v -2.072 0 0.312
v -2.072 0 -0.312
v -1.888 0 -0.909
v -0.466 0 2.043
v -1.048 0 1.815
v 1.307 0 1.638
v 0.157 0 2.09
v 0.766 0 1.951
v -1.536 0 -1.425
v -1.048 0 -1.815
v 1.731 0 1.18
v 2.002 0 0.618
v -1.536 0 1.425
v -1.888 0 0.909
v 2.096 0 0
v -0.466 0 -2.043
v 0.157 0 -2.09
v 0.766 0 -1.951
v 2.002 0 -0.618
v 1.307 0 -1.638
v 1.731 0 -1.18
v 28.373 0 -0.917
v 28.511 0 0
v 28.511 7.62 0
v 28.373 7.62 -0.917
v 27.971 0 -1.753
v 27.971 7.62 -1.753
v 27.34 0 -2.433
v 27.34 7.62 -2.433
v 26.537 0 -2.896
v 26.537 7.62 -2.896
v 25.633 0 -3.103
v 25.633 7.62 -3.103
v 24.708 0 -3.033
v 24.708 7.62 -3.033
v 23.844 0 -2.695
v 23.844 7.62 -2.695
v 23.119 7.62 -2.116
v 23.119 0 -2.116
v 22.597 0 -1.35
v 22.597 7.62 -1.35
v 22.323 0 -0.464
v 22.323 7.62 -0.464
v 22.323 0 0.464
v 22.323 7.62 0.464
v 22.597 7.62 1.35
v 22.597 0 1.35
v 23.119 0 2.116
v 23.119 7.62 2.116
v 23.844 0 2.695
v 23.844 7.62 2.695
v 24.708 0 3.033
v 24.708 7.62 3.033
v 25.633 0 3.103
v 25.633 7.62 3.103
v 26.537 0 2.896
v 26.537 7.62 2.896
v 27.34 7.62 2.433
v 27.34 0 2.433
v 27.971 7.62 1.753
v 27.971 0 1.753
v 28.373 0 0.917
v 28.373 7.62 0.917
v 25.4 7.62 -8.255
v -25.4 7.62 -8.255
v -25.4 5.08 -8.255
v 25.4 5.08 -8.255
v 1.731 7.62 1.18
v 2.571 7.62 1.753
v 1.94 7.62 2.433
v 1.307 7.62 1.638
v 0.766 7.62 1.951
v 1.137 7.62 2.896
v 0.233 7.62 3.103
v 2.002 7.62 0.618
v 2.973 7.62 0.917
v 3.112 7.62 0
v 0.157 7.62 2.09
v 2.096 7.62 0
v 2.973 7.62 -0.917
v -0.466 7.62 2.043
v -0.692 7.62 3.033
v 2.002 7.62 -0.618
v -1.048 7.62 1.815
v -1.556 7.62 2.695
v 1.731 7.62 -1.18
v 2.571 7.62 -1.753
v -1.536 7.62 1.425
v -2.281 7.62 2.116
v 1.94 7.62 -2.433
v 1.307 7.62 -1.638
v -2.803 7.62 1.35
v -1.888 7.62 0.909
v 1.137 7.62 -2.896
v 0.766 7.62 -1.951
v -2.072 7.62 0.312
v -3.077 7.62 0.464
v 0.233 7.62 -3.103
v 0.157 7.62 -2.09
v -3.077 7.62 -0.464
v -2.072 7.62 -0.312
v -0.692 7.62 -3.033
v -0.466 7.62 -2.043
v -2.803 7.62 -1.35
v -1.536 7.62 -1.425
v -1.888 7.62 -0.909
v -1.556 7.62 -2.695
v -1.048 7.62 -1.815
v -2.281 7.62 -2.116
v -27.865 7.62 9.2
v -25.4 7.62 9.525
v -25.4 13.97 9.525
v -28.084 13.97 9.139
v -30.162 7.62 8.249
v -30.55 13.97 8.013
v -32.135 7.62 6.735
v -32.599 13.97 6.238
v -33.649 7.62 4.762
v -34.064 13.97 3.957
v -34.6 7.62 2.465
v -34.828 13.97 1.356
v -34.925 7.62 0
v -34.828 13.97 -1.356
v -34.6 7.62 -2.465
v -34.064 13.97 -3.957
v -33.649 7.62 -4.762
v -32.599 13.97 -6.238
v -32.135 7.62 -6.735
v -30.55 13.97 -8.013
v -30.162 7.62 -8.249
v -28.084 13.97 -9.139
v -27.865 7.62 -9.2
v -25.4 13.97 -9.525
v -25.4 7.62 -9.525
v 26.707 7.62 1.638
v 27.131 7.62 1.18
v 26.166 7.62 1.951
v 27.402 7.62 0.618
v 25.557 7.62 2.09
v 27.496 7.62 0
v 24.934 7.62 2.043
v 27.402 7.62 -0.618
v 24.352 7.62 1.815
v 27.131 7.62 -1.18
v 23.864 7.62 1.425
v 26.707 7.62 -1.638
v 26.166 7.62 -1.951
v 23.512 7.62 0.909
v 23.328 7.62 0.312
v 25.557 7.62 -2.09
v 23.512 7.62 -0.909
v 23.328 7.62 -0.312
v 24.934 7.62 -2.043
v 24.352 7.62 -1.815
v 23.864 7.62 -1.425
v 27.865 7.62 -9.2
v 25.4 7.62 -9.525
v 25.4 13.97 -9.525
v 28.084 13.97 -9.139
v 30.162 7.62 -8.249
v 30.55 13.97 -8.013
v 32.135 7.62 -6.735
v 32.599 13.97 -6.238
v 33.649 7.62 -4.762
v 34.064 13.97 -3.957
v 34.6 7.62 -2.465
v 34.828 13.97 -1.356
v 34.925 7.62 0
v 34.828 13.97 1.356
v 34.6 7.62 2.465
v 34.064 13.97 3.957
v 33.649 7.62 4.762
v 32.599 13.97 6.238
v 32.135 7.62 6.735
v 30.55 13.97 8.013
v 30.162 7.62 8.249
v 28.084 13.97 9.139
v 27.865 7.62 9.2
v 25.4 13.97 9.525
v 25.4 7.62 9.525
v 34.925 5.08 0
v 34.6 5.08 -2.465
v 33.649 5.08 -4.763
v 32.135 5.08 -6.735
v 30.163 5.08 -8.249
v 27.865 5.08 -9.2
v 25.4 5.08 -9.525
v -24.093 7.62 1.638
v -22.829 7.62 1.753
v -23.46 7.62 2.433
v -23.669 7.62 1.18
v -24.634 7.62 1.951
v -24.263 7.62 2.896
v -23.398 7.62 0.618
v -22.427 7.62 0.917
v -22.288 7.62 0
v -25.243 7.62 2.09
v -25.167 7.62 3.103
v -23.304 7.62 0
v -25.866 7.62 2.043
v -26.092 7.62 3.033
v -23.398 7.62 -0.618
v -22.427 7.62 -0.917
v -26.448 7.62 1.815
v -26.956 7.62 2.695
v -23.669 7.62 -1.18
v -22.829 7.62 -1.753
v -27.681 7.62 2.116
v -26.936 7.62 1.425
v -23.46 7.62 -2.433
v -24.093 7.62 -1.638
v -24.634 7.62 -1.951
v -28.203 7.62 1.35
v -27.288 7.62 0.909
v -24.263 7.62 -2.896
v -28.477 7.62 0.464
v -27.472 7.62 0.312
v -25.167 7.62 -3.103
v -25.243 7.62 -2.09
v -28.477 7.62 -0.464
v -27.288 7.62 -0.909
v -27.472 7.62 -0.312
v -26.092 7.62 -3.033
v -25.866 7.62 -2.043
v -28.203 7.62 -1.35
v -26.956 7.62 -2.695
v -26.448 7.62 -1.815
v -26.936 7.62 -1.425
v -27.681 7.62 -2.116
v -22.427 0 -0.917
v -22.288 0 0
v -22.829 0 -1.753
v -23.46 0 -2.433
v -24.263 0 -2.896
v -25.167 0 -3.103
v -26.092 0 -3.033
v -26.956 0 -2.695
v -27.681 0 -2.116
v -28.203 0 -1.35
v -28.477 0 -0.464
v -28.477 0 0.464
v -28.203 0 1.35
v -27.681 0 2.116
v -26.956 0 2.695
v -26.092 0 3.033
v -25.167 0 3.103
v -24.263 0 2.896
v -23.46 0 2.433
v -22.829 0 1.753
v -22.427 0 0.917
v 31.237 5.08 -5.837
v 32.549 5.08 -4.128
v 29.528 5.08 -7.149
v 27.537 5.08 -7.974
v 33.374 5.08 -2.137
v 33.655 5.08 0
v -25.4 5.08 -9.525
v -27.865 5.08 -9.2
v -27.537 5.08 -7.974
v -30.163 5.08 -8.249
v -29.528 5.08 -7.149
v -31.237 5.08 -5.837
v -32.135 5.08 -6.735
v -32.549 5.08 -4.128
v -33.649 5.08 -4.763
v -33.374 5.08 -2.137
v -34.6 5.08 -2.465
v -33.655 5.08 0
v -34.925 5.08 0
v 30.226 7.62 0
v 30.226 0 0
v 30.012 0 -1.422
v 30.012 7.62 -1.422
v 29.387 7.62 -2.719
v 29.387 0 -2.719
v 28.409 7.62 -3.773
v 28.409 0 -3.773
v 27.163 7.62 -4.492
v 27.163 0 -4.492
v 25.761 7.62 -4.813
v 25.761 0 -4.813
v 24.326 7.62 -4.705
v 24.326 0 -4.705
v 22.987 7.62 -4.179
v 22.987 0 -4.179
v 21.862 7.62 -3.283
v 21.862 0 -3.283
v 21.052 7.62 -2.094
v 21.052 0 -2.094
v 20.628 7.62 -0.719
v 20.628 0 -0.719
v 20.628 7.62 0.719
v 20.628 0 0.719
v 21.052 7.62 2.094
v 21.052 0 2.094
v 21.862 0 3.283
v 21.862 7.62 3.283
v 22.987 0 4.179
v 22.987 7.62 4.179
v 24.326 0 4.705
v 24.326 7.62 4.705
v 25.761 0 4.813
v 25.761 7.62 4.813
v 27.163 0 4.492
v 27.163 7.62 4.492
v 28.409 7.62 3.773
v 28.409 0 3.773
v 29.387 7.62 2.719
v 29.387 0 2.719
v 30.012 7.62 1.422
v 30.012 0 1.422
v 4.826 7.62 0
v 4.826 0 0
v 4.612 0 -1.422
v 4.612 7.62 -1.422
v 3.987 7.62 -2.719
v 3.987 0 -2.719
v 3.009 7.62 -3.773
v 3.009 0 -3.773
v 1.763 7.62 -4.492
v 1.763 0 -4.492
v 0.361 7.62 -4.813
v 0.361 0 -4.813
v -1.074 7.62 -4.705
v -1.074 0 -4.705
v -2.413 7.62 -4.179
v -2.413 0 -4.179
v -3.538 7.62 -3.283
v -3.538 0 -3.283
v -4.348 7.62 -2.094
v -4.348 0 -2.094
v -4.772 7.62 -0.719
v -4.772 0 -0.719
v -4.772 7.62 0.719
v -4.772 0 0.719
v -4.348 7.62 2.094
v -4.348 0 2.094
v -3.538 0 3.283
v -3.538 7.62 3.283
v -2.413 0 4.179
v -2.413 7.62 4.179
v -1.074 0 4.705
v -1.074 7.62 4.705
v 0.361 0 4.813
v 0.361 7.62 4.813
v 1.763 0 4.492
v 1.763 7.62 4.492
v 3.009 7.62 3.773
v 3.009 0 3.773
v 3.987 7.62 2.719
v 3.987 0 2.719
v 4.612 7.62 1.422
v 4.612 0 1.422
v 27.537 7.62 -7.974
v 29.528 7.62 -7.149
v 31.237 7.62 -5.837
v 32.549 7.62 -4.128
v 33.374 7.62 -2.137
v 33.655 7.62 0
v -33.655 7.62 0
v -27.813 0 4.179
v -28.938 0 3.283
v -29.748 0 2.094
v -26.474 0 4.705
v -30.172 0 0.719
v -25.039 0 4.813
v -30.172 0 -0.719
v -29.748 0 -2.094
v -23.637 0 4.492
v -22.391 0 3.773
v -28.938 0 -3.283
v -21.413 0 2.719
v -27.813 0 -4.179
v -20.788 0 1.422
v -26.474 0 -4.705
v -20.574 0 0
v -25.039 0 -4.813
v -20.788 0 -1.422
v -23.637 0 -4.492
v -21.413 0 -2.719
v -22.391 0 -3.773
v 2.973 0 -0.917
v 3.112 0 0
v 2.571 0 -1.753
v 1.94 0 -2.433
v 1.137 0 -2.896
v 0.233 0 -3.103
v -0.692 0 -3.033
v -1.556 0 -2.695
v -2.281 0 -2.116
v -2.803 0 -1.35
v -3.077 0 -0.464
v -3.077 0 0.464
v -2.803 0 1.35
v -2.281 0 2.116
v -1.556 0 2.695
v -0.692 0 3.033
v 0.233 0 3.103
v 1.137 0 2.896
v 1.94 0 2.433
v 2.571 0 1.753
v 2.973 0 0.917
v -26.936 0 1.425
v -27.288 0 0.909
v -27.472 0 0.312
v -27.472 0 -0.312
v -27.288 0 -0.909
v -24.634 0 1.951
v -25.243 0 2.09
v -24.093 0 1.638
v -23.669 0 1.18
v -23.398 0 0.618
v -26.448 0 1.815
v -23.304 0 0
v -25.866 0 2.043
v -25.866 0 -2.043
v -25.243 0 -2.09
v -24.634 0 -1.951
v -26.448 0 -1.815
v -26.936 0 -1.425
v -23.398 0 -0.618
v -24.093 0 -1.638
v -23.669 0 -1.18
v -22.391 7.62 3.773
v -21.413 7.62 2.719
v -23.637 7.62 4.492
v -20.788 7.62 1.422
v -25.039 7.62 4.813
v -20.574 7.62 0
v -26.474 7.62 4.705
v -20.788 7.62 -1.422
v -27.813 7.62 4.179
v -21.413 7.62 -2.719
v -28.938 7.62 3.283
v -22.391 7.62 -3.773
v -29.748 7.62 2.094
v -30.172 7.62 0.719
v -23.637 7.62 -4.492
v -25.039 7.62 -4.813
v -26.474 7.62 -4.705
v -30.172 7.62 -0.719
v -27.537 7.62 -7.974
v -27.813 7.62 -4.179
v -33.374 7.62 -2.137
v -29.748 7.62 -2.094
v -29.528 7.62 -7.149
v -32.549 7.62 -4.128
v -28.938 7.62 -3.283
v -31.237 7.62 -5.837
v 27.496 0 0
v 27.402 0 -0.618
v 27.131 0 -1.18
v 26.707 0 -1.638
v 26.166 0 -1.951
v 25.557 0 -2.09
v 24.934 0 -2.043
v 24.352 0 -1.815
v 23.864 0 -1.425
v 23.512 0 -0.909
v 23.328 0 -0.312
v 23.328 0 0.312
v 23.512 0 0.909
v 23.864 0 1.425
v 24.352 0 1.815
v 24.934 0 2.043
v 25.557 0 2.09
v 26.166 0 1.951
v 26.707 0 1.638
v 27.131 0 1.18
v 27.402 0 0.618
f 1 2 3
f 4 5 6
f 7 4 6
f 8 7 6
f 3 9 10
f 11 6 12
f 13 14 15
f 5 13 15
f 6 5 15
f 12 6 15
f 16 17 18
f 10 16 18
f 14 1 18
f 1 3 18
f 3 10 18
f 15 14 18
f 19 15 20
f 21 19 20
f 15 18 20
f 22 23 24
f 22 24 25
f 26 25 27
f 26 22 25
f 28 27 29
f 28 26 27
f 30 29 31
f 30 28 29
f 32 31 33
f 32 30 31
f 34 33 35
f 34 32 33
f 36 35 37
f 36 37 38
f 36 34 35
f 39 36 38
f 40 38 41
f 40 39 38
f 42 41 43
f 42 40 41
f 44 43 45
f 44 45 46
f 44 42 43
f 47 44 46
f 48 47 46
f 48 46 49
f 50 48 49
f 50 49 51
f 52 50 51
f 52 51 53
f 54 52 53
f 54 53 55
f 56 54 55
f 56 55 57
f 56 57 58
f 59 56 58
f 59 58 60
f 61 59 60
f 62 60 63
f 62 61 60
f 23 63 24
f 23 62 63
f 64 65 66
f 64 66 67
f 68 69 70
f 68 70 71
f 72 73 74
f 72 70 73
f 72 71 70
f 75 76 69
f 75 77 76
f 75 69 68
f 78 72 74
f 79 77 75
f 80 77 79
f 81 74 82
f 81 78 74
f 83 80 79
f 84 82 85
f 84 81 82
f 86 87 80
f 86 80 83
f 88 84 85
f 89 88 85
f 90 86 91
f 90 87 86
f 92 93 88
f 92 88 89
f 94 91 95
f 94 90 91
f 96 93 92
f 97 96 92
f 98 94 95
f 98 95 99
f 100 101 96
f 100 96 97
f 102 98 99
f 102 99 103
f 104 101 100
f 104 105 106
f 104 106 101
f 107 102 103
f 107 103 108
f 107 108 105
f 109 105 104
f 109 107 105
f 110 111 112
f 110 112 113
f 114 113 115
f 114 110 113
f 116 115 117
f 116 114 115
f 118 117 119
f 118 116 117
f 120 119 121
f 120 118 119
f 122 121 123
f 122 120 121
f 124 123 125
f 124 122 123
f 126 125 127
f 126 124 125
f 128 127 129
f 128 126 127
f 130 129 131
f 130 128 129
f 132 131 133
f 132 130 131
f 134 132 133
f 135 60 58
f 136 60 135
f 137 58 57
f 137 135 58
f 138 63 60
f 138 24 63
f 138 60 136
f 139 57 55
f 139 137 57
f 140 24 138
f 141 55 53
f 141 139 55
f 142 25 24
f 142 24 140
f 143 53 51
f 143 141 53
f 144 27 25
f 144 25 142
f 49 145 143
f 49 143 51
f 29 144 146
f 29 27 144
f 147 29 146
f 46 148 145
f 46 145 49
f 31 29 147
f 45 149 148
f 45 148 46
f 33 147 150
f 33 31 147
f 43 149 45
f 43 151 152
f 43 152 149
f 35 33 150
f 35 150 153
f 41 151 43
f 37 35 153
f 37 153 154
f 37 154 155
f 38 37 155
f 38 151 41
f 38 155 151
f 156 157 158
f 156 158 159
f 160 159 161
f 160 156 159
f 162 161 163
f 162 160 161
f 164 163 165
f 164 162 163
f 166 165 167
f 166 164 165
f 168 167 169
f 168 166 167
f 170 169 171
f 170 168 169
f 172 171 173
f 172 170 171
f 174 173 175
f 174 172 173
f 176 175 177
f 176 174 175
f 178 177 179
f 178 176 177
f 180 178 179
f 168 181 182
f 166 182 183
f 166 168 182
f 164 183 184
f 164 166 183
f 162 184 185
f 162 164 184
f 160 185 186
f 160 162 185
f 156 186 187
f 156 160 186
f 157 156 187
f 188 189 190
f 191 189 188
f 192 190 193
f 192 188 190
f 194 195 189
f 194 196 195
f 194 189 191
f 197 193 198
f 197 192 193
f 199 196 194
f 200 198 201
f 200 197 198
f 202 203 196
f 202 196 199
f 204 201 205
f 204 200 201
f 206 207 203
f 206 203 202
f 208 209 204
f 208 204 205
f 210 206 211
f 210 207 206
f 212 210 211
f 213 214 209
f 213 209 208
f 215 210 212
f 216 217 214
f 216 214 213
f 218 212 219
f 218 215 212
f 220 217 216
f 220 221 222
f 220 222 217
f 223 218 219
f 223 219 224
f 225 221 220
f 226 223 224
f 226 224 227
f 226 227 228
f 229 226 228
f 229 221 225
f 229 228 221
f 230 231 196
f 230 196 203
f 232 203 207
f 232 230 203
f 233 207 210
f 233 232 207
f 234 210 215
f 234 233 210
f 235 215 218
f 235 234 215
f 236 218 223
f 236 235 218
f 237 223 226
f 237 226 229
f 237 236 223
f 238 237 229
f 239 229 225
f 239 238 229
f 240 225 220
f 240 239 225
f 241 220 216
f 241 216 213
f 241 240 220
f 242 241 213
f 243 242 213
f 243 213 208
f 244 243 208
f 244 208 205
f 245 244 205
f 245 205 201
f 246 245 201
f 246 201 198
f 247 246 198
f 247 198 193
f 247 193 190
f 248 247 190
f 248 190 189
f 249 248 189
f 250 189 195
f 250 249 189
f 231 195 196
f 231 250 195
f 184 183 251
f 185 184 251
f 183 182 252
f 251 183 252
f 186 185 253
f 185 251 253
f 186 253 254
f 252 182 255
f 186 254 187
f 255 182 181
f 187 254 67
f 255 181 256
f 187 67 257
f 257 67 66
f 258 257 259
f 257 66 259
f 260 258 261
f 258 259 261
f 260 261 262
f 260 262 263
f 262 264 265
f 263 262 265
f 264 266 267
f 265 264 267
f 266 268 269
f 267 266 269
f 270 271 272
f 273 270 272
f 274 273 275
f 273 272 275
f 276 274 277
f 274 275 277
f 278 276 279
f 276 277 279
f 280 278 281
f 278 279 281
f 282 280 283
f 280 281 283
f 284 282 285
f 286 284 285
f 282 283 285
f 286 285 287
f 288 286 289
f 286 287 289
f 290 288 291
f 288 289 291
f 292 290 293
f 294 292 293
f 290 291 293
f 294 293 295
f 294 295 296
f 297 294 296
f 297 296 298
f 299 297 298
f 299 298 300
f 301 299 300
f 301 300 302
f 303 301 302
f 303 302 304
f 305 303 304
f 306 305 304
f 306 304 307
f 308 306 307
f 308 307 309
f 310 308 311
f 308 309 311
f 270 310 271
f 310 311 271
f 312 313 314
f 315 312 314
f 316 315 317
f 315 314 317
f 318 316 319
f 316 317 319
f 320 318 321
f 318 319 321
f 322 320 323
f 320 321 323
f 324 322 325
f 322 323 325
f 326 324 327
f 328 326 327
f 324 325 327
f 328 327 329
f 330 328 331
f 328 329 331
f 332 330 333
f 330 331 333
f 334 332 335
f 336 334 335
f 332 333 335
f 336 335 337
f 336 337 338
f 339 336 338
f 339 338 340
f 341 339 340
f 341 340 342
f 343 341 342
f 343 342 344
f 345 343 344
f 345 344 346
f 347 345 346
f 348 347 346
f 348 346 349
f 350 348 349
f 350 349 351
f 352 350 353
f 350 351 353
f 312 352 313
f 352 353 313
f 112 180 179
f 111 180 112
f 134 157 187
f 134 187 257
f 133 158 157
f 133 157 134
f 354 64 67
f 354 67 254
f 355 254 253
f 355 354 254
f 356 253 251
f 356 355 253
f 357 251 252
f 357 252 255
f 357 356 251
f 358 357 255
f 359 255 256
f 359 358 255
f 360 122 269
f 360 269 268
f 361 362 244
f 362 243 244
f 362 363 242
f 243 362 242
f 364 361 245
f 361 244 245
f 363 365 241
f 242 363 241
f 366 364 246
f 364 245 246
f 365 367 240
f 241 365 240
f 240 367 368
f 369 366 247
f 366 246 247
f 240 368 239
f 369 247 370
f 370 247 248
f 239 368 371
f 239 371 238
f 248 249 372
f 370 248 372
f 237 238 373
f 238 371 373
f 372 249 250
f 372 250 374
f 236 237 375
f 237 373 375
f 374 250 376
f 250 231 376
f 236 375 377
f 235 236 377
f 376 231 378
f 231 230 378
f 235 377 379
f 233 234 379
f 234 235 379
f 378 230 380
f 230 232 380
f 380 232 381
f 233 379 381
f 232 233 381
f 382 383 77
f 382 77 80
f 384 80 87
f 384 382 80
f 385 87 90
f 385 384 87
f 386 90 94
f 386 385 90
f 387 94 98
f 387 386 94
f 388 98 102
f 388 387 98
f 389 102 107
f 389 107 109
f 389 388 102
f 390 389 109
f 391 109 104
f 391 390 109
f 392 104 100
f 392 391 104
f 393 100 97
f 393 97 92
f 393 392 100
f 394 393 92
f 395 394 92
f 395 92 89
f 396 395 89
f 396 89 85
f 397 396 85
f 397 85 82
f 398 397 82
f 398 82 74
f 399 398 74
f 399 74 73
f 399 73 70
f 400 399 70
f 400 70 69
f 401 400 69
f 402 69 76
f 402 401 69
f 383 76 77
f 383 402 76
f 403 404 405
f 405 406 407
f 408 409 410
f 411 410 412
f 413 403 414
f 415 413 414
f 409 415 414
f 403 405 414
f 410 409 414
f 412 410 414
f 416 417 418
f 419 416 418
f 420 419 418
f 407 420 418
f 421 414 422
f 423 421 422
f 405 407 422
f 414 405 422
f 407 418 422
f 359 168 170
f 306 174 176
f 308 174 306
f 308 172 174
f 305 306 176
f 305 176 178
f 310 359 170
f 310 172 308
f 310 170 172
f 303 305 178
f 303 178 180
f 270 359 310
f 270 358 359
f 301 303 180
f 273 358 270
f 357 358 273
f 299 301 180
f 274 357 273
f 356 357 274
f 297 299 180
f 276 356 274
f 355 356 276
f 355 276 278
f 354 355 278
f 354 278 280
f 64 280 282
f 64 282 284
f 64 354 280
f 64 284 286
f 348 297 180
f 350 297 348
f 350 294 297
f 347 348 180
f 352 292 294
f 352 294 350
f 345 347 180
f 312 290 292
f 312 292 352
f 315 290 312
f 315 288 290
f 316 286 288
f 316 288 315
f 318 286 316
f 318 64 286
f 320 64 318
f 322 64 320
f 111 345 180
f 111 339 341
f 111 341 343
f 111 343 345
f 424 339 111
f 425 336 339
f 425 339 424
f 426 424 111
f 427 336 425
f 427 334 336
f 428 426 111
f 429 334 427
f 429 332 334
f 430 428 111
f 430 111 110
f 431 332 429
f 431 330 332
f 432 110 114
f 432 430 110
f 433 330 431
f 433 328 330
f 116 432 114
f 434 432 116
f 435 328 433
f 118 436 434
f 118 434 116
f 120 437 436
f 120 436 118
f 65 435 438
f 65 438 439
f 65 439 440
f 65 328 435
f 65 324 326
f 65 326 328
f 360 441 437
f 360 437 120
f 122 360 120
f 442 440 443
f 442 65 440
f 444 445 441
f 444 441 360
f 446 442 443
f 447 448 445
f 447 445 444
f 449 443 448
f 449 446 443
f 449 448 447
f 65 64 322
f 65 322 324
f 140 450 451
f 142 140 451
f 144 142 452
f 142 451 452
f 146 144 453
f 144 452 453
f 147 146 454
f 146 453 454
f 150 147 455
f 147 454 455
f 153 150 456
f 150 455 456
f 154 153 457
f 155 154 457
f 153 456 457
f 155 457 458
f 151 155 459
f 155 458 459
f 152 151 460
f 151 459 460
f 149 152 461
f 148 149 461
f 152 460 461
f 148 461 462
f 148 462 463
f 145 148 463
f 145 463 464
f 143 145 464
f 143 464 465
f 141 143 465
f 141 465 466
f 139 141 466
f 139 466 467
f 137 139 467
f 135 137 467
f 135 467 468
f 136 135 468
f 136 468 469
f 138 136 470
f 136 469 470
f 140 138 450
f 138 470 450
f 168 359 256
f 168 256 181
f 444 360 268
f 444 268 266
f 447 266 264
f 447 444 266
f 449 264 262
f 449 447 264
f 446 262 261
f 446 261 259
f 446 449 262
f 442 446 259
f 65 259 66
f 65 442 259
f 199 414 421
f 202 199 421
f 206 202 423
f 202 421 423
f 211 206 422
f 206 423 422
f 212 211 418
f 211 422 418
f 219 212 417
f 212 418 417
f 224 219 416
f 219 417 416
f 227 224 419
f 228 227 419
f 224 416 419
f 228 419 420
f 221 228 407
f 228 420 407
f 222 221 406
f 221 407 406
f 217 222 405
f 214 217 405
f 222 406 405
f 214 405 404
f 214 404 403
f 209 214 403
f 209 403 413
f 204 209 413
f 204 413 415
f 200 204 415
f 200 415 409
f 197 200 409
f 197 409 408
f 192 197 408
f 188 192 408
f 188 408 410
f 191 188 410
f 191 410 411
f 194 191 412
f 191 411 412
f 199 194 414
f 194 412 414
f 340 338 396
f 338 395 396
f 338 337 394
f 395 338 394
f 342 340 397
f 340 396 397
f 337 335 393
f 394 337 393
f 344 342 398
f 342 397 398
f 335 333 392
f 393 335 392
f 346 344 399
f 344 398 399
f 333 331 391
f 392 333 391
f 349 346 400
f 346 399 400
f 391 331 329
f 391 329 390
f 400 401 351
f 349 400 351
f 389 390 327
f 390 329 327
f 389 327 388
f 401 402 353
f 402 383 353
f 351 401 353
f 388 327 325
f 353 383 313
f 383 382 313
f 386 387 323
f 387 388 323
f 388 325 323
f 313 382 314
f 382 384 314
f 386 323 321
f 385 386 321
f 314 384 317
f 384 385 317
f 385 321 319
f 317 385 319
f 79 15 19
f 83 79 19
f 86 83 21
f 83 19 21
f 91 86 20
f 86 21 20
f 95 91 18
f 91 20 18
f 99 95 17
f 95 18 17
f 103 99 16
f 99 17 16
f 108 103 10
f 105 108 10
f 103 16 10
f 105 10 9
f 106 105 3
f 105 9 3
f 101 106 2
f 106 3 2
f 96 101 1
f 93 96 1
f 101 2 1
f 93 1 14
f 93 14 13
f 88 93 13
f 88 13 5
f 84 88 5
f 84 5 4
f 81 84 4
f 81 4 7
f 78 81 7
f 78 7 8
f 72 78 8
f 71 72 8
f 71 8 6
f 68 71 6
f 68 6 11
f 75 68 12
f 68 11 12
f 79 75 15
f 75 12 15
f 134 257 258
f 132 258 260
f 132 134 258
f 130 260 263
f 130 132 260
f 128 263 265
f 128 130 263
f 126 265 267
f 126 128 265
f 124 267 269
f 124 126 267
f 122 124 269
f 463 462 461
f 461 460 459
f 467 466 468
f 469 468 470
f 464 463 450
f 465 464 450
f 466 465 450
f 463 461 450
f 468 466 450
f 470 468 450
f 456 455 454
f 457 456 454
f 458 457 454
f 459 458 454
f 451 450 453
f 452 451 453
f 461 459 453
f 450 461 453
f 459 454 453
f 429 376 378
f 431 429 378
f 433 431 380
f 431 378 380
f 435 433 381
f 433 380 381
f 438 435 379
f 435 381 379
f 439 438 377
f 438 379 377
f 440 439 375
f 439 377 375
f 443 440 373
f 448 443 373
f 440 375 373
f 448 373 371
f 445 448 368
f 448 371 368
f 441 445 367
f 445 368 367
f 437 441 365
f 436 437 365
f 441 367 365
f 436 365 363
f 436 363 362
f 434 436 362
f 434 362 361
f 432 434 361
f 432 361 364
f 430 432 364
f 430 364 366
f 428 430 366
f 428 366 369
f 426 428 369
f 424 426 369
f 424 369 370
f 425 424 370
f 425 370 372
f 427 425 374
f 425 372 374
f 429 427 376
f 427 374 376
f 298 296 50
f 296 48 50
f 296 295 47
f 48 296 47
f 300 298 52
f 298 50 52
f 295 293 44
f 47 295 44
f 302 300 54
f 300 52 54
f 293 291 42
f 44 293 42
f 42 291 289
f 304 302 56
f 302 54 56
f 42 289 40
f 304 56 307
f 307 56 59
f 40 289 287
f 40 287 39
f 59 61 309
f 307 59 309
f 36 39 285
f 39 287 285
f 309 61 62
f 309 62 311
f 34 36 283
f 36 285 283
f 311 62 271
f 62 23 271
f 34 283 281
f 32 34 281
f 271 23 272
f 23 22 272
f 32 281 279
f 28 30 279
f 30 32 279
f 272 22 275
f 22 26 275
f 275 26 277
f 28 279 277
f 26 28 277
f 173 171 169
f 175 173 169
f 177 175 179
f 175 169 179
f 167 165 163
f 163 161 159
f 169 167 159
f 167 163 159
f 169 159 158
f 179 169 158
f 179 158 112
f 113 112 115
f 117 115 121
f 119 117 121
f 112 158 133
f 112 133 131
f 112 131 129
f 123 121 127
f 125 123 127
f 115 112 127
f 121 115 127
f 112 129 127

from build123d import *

# Parameters (mm, degrees)
SKETCH1_R        = 2.0955
PLUGS_DEPTH      = 7.62
SKETCH1_R_2      = 4.826
SKETCH1_R_3      = 3.1115
PLUGS_2_DEPTH    = 7.62
PLUGS_3_DEPTH    = 7.62
PLUGS_4_DEPTH    = 7.62
PLUGS_5_DEPTH    = 7.62
PLUGS_6_DEPTH    = 7.62
BACK_PLATE_DEPTH = 6.35
RAIN_GUARD_DEPTH = 2.54


with BuildPart() as part:
    # Sketch1 → Plugs (new body)
    with BuildSketch(Plane(origin=(0, 0, 0), x_dir=(1, 0, 0), z_dir=(0, 1, 0))):
        with Locations((-25.4, 0)):
            Circle(SKETCH1_R)
    extrude(amount=PLUGS_DEPTH)



with BuildPart() as body_2:
    # Sketch1 → Plugs 2 (new body)
    with BuildSketch(Plane(origin=(0, 0, 0), x_dir=(1, 0, 0), z_dir=(0, 1, 0))):
        with Locations((-25.4, 0)):
            Circle(SKETCH1_R_2)
        with Locations((-25.4, 0)):
            Circle(SKETCH1_R_3, mode=Mode.SUBTRACT)
    extrude(amount=PLUGS_2_DEPTH)


with BuildPart() as body_3:
    # Sketch1 → Plugs 3 (new body)
    with BuildSketch(Plane(origin=(0, 0, 0), x_dir=(1, 0, 0), z_dir=(0, 1, 0))):
        Circle(SKETCH1_R)
    extrude(amount=PLUGS_3_DEPTH)


with BuildPart() as body_4:
    # Sketch1 → Plugs 4 (new body)
    with BuildSketch(Plane(origin=(0, 0, 0), x_dir=(1, 0, 0), z_dir=(0, 1, 0))):
        Circle(SKETCH1_R_2)
        Circle(SKETCH1_R_3, mode=Mode.SUBTRACT)
    extrude(amount=PLUGS_4_DEPTH)


with BuildPart() as body_5:
    # Sketch1 → Plugs 5 (new body)
    with BuildSketch(Plane(origin=(0, 0, 0), x_dir=(1, 0, 0), z_dir=(0, 1, 0))):
        with Locations((25.4, 0)):
            Circle(SKETCH1_R)
    extrude(amount=PLUGS_5_DEPTH)


with BuildPart() as body_6:
    # Sketch1 → Plugs 6 (new body)
    with BuildSketch(Plane(origin=(0, 0, 0), x_dir=(1, 0, 0), z_dir=(0, 1, 0))):
        with Locations((25.4, 0)):
            Circle(SKETCH1_R_2)
        with Locations((25.4, 0)):
            Circle(SKETCH1_R_3, mode=Mode.SUBTRACT)
    extrude(amount=PLUGS_6_DEPTH)


with BuildPart() as part_1:
    add(part.part)

    add(body_2.part)  # Back Plate merges body 2

    add(body_3.part)  # Back Plate merges body 3

    add(body_4.part)  # Back Plate merges body 4

    add(body_5.part)  # Back Plate merges body 5

    add(body_6.part)  # Back Plate merges body 6
    # Sketch2 → Back Plate (add)
    with BuildSketch(Plane(origin=(0, 7.62, 0), x_dir=(1, 0, 0), z_dir=(0, 1, 0))):
        with BuildLine():
            Line((-25.4, 9.525), (25.4, 9.525))
            ThreePointArc((25.4, 9.525), (34.925, 0), (25.4, -9.525))
            Line((25.4, -9.525), (-25.4, -9.525))
            ThreePointArc((-25.4, -9.525), (-34.925, 0), (-25.4, 9.525))
        make_face()
    extrude(amount=BACK_PLATE_DEPTH)

    # Sketch3 → Rain Guard (add)
    with BuildSketch(Plane.XZ.offset(-7.62)):
        with BuildLine():
            Line((25.4, -9.525), (-25.4, -9.525))
            ThreePointArc((-25.4, -9.525), (-32.135192091, -6.735192091), (-34.925, 0))
            Line((-34.925, 0), (-33.655, 0))
            ThreePointArc((-33.655, 0), (-31.237166479, -5.837166479), (-25.4, -8.255))
            Line((-25.4, -8.255), (25.4, -8.255))
            ThreePointArc((25.4, -8.255), (31.237166479, -5.837166479), (33.655, 0))
            Line((33.655, 0), (34.925, 0))
            ThreePointArc((34.925, 0), (32.135192091, -6.735192091), (25.4, -9.525))
        make_face()
    extrude(amount=RAIN_GUARD_DEPTH)


solid = part_1.part
